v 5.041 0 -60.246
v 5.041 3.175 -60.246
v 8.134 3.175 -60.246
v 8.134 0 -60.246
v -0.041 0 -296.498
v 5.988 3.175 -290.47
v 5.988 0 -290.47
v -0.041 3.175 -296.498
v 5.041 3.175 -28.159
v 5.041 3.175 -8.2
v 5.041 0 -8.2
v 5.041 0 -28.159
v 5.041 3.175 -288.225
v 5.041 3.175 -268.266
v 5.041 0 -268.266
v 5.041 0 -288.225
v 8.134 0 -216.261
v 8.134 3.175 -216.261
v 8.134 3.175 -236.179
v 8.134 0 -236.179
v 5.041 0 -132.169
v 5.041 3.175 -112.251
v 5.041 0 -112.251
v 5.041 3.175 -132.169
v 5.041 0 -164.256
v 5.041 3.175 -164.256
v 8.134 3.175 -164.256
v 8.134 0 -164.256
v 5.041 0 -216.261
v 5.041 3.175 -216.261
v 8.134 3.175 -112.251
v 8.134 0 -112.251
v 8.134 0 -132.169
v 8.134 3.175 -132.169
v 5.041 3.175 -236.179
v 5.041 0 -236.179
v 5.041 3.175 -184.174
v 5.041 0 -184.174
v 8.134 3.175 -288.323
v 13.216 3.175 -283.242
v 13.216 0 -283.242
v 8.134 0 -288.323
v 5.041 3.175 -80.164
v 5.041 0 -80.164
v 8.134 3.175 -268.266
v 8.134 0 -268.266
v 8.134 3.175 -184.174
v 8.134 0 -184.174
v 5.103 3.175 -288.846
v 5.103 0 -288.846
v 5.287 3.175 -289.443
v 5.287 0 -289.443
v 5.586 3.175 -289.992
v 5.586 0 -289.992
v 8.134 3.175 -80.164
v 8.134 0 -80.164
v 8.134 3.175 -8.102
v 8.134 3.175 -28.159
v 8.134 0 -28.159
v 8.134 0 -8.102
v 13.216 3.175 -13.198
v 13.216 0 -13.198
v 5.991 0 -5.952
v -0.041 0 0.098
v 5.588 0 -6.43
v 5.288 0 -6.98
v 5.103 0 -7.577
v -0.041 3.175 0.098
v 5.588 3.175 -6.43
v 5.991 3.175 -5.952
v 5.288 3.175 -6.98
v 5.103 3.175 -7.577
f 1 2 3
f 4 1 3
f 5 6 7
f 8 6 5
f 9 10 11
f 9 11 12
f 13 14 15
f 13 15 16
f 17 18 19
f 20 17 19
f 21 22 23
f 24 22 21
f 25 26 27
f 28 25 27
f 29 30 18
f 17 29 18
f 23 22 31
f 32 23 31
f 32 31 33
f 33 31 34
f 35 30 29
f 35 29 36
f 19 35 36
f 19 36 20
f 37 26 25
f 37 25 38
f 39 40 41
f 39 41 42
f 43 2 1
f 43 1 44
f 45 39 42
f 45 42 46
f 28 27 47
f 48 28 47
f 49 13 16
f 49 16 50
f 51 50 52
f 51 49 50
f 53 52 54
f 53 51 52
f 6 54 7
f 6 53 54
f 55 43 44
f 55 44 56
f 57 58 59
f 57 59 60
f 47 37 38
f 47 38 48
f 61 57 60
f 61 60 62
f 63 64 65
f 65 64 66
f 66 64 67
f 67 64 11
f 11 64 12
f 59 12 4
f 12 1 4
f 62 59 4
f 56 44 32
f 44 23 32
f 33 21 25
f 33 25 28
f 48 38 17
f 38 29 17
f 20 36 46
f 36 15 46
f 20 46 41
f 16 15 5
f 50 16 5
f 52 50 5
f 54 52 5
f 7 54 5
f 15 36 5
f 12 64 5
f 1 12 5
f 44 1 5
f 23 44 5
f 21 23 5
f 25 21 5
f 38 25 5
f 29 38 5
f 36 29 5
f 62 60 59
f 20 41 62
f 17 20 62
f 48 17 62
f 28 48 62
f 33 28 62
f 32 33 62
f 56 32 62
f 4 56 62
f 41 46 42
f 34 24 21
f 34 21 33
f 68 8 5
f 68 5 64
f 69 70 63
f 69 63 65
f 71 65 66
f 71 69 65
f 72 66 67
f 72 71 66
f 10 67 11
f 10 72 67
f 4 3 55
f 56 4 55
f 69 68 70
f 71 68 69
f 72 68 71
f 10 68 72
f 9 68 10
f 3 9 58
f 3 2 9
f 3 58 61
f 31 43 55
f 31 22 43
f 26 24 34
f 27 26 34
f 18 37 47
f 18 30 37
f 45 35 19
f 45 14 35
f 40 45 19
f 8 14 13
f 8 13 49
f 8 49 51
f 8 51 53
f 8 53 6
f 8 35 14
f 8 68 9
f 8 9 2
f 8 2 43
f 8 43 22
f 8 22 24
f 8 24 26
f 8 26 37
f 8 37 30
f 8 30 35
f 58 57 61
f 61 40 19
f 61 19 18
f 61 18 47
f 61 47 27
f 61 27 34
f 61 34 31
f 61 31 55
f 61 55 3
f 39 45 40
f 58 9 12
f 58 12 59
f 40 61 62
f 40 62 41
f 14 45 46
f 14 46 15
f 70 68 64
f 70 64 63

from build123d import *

# Parameters (mm, degrees)
SKETCH1_W           = 3.175
SKETCH1_H           = 20
BOSS_EXTRUDE1_DEPTH = 3.175
SKETCH10_W          = 3.09372
SKETCH10_H          = 19.91872
BOSS_EXTRUDE2_DEPTH = 3.175


with BuildPart() as part:
    # Sketch1 → Boss-Extrude1 (new body)
    with BuildSketch(Plane(origin=(0, 0, 0), x_dir=(1, 0, 0), z_dir=(0, 1, 0))):
        with BuildLine():
            Line((5.92993597, 290.47006403), (0, 296.4))
            Line((0, 296.4), (0, 0))
            Line((0, 0), (5.933366161, 5.951511012))
            ThreePointArc((5.933366161, 5.951511012), (5.242610834, 6.982741285), (5, 8.2))
            Line((5, 8.2), (5, 28.2))
            Line((5, 28.2), (8.175, 28.2))
            Line((8.175, 28.2), (8.175, 8.2))
            Line((8.175, 8.2), (13.175, 13.21529052))
            Line((13.175, 13.21529052), (13.175, 283.225))
            Line((13.175, 283.225), (8.175, 288.225))
            Line((8.175, 288.225), (8.175, 268.225))
            Line((8.175, 268.225), (5, 268.225))
            Line((5, 268.225), (5, 288.225))
            ThreePointArc((5, 288.225), (5.241682484, 289.440019898), (5.92993597, 290.47006403))
        make_face()
        with Locations((6.5875, 70.205)):
            Rectangle(SKETCH1_W, SKETCH1_H, mode=Mode.SUBTRACT)
        with Locations((6.5875, 122.21)):
            Rectangle(SKETCH1_W, SKETCH1_H, mode=Mode.SUBTRACT)
        with Locations((6.5875, 174.215)):
            Rectangle(SKETCH1_W, SKETCH1_H, mode=Mode.SUBTRACT)
        with Locations((6.5875, 226.22)):
            Rectangle(SKETCH1_W, SKETCH1_H, mode=Mode.SUBTRACT)
    extrude(amount=BOSS_EXTRUDE1_DEPTH)

    # Sketch10 → Boss-Extrude2 (add)
    with BuildSketch(Plane(origin=(0, 3.175, 0), x_dir=(1, 0, 0), z_dir=(0, 1, 0))):
        with BuildLine():
            Line((-0.04064, 296.498113639), (-0.04064, -0.098325868))
            Line((-0.04064, -0.098325868), (5.991025757, 5.95178535))
            ThreePointArc((5.991025757, 5.95178535), (5.287996872, 6.979579765), (5.04064, 8.2))
            Line((5.04064, 8.2), (5.04064, 28.15936))
            Line((5.04064, 28.15936), (8.13436, 28.15936))
            Line((8.13436, 28.15936), (8.13436, 8.101674132))
            Line((8.13436, 8.101674132), (13.21564, 13.198493215))
            Line((13.21564, 13.198493215), (13.21564, 283.241833639))
            Line((13.21564, 283.241833639), (8.13436, 288.323113639))
            Line((8.13436, 288.323113639), (8.13436, 268.26564))
            Line((8.13436, 268.26564), (5.04064, 268.26564))
            Line((5.04064, 268.26564), (5.04064, 288.225))
            ThreePointArc((5.04064, 288.225), (5.287066096, 289.443216062), (5.987595917, 290.469877722))
            Line((5.987595917, 290.469877722), (-0.04064, 296.498113639))
        make_face()
        with Locations((6.5875, 226.22)):
            Rectangle(SKETCH10_W, SKETCH10_H, mode=Mode.SUBTRACT)
        with Locations((6.5875, 174.215)):
            Rectangle(SKETCH10_W, SKETCH10_H, mode=Mode.SUBTRACT)
        with Locations((6.5875, 122.21)):
            Rectangle(SKETCH10_W, SKETCH10_H, mode=Mode.SUBTRACT)
        with Locations((6.5875, 70.205)):
            Rectangle(SKETCH10_W, SKETCH10_H, mode=Mode.SUBTRACT)
    extrude(amount=-BOSS_EXTRUDE2_DEPTH)


solid = part.part
